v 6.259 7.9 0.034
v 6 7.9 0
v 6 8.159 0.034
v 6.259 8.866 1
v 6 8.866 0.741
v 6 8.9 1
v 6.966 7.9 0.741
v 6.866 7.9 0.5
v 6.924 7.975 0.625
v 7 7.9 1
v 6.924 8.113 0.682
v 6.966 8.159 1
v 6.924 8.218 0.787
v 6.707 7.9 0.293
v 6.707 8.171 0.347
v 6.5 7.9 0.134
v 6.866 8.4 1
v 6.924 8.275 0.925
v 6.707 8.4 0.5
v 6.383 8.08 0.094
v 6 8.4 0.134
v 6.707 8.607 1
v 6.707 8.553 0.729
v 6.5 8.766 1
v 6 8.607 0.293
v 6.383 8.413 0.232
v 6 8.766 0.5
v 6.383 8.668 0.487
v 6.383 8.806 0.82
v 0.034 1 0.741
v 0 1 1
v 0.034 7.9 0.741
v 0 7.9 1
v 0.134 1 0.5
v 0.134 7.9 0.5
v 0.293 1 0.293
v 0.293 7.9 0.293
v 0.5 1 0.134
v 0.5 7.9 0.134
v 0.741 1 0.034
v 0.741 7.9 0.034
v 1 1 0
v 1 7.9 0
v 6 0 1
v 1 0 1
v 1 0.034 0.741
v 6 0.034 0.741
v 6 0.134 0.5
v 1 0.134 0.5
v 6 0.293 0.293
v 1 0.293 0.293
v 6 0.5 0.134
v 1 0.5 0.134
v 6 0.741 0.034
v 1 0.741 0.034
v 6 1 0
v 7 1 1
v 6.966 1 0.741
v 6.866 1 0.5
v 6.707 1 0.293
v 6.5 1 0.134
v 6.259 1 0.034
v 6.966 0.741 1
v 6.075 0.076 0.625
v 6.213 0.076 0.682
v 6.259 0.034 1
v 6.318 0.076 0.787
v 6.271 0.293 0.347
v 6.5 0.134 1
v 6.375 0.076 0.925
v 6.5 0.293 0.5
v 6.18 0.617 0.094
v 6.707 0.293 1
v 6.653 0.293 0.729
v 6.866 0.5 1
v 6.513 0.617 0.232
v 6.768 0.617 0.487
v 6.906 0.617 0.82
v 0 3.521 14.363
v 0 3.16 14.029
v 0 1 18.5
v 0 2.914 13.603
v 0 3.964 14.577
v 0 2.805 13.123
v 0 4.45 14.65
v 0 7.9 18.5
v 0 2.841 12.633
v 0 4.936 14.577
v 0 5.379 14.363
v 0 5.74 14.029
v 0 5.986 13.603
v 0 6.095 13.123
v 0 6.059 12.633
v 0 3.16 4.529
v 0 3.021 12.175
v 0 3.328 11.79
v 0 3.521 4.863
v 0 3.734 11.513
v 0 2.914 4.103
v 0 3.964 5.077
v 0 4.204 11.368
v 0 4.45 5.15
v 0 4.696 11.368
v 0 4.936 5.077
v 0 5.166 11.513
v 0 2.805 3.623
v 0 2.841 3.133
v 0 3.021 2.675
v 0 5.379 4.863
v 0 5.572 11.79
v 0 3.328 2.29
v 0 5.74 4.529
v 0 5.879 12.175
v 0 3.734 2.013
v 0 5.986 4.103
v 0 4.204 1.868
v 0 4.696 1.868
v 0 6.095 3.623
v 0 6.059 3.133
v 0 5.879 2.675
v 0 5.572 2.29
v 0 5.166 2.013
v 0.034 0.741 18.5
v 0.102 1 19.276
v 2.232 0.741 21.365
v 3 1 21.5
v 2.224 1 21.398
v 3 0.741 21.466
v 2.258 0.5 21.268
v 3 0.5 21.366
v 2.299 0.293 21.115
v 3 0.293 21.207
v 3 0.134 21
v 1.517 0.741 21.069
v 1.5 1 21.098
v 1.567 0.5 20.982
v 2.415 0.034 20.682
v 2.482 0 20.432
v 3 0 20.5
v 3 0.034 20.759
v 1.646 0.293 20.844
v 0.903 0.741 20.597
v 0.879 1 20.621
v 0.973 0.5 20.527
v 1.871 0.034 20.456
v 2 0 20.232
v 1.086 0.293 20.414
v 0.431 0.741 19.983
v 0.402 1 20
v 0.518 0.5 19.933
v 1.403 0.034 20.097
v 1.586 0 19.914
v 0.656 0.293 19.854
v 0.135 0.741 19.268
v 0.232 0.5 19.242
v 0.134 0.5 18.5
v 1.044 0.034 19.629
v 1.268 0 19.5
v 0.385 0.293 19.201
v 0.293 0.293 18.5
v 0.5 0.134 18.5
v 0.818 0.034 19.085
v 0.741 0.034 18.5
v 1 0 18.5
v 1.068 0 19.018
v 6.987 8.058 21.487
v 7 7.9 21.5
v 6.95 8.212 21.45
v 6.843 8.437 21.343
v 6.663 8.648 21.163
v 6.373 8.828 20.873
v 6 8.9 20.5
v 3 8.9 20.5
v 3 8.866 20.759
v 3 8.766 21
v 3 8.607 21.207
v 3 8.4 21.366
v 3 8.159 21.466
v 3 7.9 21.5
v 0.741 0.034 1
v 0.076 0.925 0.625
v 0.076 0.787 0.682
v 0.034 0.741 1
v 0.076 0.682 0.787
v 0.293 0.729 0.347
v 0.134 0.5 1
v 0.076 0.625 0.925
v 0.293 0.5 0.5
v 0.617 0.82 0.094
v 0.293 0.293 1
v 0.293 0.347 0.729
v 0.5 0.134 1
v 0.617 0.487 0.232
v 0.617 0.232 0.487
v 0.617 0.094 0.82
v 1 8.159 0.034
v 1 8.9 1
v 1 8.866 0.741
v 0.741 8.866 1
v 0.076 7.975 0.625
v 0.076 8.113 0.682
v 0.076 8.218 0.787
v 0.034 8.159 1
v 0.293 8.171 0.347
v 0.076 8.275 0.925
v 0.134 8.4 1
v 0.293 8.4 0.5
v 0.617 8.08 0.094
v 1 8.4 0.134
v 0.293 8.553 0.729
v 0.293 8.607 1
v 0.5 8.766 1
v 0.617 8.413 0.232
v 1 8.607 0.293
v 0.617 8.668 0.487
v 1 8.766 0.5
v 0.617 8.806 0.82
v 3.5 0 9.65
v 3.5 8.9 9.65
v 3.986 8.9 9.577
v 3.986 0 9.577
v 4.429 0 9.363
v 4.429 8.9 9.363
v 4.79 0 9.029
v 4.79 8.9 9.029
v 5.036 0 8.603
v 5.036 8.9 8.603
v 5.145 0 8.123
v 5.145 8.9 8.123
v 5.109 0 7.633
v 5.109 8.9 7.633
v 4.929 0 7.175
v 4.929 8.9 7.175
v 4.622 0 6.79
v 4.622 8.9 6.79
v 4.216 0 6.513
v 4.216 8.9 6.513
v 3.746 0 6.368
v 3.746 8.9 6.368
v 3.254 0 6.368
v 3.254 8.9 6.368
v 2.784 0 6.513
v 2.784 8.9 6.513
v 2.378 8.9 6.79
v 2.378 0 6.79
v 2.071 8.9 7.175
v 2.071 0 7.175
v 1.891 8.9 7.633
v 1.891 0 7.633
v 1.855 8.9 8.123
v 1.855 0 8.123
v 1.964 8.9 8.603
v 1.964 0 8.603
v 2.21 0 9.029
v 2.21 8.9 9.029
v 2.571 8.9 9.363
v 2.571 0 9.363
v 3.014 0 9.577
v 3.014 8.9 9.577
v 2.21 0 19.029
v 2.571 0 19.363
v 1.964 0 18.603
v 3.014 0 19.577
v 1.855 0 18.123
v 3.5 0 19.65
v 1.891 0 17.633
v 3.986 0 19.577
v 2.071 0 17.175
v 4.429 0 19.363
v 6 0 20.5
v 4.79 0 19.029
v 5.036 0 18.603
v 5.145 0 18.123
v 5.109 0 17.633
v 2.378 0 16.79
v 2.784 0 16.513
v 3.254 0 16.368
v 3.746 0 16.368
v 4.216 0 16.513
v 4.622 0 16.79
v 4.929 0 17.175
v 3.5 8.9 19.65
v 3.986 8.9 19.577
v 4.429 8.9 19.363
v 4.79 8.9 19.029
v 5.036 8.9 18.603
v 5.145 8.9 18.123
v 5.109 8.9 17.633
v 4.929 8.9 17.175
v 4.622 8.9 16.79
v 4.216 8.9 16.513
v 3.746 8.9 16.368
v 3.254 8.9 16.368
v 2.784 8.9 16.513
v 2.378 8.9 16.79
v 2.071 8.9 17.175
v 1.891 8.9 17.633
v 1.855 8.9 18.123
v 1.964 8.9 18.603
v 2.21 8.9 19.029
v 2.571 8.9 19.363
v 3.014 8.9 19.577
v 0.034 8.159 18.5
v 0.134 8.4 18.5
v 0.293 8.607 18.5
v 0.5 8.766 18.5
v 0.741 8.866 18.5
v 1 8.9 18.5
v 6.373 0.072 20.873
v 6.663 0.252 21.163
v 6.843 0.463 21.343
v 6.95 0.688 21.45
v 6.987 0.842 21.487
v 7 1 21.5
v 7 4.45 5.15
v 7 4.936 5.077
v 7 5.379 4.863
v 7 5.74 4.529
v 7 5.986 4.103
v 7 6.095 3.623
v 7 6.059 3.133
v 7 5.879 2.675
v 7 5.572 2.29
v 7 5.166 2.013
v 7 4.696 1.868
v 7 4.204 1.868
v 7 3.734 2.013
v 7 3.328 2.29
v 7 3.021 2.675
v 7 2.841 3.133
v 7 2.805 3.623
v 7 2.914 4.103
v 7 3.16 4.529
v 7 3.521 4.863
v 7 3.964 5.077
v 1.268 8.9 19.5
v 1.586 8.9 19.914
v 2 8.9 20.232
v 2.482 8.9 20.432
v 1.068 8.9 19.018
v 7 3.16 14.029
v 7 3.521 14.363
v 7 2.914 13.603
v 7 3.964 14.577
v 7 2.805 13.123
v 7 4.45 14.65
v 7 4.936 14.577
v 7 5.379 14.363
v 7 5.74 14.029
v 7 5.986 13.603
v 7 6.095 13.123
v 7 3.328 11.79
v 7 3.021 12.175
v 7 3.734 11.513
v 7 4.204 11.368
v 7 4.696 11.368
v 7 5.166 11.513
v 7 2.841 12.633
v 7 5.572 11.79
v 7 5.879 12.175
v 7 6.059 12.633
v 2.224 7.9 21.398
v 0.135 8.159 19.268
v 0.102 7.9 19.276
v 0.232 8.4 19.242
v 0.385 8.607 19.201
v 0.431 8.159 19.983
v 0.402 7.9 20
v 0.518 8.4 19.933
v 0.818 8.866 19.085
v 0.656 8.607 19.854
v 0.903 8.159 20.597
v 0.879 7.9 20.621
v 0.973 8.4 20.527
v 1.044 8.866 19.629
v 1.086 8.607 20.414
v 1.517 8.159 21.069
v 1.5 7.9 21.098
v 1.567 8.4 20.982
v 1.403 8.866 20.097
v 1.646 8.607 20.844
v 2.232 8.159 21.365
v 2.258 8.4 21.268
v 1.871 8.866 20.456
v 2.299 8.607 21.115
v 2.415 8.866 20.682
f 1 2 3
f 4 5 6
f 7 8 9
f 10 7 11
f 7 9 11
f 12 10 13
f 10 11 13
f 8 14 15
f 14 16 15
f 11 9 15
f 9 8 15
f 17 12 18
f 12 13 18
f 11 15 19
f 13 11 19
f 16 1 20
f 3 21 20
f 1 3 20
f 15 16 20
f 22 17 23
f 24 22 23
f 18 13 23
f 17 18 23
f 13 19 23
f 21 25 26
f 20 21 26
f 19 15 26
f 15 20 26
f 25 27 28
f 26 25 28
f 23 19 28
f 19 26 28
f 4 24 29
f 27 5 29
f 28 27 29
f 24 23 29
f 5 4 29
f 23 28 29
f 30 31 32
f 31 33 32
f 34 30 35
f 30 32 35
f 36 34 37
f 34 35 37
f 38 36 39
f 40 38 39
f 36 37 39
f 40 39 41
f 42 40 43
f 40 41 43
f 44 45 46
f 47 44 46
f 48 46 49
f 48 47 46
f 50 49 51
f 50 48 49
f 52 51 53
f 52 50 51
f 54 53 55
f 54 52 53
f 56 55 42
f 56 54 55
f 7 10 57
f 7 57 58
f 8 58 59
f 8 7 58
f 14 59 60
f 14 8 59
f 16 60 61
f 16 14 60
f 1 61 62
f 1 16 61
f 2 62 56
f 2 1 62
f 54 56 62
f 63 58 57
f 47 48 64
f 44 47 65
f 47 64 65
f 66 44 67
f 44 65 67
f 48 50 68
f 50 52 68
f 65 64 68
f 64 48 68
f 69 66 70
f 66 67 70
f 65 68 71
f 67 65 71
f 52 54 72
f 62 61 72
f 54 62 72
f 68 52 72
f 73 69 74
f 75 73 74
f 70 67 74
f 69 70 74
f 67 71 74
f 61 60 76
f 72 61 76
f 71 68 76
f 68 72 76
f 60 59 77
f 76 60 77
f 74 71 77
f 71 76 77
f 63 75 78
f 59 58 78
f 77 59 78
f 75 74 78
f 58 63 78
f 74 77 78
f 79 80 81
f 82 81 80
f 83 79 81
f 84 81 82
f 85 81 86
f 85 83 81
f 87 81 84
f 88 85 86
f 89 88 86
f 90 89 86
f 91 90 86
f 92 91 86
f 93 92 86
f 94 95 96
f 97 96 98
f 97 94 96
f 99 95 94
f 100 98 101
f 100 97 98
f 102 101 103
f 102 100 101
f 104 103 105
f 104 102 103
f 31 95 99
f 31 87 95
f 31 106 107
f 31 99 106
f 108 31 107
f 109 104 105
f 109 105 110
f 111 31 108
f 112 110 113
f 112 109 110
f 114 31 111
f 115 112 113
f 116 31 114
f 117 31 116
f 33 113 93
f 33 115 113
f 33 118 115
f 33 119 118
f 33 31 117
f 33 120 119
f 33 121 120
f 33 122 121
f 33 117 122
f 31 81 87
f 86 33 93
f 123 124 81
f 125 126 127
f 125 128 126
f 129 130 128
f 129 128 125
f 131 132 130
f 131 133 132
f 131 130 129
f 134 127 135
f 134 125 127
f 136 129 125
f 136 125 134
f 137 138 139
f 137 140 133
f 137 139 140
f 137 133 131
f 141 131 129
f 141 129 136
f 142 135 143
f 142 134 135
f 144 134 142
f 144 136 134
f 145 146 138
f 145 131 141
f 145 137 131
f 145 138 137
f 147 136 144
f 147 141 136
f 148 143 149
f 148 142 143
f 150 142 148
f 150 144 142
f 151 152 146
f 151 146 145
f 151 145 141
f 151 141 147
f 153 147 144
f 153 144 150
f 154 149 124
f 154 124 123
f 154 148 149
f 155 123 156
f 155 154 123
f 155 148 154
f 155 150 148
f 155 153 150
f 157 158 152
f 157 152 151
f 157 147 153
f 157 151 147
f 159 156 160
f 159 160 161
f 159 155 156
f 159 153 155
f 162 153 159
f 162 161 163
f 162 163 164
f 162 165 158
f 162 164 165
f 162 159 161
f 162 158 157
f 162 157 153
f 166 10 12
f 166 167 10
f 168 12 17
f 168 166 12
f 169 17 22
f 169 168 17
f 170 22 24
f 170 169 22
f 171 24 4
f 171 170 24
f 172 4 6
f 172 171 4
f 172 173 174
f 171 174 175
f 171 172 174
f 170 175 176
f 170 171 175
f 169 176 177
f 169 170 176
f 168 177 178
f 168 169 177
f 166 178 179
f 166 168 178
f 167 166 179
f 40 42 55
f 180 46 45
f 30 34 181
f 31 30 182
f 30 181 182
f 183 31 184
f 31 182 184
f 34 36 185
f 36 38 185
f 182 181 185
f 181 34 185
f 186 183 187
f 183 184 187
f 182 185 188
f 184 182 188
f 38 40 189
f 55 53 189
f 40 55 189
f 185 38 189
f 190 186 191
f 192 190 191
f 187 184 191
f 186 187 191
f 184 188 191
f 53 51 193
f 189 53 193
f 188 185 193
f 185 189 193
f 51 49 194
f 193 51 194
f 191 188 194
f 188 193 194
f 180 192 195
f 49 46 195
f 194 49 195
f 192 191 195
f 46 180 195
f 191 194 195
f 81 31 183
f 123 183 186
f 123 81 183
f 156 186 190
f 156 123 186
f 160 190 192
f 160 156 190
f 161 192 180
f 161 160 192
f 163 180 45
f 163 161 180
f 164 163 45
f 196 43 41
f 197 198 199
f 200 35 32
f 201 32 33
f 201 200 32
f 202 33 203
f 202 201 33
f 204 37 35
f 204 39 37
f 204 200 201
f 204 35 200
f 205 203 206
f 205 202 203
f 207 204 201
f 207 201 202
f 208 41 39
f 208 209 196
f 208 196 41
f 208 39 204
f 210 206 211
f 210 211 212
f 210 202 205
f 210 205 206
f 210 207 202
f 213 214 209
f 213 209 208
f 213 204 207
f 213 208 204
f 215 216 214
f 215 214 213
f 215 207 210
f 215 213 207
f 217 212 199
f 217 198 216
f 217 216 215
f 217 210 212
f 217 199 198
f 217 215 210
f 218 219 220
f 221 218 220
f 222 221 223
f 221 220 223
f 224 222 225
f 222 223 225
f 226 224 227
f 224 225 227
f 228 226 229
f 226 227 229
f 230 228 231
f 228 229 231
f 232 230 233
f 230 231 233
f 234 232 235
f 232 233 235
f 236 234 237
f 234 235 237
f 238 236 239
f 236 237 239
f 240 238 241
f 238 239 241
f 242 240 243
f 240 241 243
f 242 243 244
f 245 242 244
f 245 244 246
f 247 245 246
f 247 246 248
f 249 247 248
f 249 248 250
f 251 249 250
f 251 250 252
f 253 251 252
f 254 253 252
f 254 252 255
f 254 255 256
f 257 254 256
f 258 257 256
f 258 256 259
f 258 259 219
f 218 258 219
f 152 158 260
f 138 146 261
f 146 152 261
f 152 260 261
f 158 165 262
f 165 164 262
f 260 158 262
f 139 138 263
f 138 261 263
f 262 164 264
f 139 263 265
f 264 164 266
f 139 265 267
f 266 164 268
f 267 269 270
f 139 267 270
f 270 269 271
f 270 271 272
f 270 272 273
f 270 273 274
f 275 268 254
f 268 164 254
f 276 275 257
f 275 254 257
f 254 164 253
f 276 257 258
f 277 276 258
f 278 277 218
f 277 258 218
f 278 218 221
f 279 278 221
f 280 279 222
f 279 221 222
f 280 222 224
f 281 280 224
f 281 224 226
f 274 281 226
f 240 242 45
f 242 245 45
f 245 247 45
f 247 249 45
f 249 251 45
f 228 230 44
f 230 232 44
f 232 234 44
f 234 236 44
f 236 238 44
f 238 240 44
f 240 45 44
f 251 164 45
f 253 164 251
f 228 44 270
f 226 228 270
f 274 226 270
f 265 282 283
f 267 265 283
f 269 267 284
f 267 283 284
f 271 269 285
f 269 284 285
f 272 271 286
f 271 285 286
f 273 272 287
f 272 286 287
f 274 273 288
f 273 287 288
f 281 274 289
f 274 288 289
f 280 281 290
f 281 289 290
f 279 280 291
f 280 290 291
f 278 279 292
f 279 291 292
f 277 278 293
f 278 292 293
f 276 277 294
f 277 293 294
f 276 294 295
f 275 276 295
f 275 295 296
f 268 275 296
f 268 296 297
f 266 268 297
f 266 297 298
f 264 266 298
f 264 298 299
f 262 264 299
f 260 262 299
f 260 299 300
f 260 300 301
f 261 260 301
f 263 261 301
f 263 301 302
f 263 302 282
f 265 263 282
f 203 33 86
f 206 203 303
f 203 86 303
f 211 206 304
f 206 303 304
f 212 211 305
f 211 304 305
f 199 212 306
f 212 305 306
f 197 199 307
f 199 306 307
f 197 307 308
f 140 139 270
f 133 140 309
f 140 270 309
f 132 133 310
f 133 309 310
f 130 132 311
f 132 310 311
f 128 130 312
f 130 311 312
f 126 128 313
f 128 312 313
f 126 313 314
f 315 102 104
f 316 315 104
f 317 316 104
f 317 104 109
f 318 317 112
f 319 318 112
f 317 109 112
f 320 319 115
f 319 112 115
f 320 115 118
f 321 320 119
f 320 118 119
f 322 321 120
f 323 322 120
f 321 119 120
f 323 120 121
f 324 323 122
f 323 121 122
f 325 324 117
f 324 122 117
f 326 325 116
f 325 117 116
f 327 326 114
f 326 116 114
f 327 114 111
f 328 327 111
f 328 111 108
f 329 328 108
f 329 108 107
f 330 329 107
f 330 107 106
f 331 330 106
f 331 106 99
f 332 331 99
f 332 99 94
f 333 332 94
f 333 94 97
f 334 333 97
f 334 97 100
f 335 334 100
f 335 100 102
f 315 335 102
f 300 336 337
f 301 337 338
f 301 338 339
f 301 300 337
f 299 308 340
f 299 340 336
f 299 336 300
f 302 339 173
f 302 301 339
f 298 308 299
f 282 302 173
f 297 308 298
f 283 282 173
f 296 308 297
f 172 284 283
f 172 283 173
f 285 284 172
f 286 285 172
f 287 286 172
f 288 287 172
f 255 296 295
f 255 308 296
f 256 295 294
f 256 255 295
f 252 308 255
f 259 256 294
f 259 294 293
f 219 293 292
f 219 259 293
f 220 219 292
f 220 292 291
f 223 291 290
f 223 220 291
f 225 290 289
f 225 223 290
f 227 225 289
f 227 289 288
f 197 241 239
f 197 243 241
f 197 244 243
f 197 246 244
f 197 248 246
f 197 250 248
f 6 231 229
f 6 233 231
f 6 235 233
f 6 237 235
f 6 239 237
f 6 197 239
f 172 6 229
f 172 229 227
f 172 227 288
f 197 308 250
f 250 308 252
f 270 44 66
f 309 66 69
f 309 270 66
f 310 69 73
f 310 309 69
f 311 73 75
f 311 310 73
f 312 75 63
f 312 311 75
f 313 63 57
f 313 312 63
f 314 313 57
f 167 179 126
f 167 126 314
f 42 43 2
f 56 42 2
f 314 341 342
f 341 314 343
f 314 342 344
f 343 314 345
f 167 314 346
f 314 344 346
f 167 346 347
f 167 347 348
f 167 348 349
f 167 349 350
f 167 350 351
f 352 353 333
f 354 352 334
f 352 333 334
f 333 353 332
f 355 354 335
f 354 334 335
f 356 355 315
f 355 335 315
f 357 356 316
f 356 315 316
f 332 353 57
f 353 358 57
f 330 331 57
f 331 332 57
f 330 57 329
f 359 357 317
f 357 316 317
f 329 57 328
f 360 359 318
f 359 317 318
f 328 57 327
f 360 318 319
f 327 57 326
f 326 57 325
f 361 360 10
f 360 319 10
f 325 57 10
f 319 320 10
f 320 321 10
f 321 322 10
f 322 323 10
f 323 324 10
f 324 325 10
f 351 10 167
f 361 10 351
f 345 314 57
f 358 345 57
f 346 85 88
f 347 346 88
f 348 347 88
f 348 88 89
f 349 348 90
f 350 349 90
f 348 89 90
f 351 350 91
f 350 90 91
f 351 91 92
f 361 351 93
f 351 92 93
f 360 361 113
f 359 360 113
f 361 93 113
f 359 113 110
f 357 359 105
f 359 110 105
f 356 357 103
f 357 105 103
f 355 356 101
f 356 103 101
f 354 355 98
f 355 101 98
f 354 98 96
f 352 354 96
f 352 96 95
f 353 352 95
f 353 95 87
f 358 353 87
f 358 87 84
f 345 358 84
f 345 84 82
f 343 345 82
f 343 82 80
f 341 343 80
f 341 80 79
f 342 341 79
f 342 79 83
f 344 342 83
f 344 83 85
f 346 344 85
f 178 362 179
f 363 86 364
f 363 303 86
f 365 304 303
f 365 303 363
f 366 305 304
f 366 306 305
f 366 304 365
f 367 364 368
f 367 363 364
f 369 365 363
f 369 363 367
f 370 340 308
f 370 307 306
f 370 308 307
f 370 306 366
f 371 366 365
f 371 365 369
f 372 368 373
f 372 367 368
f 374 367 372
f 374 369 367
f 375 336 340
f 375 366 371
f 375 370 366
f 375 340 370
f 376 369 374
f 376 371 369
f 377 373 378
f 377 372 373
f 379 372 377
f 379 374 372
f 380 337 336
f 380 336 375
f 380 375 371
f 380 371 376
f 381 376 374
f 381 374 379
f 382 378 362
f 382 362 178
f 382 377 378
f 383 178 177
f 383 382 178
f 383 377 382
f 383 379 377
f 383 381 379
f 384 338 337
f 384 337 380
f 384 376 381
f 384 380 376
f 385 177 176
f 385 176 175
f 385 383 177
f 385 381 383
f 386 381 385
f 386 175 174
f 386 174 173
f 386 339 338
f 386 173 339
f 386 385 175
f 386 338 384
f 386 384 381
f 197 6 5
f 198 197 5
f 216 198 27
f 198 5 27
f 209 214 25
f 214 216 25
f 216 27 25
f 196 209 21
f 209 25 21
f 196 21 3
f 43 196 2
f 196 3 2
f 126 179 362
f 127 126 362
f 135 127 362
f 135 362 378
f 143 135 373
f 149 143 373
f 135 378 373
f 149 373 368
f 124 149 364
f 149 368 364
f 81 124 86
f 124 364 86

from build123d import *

# Parameters (mm, degrees)
SKETCH_1_W          = 7
SKETCH_1_H          = 8.9
EXTRUDE_1_DEPTH     = 21.5
FILLET_1_R          = 1
SKETCH_6_R          = 1.65
CUT_EXTRUDE_2_DEPTH = 10
SKETCH_7_R          = 1.65
CUT_EXTRUDE_3_DEPTH = 10
FILLET_3_R          = 3


with BuildPart() as part:
    # 草图1 → 凸台-拉伸1 (new body)
    with BuildSketch(Plane.XY):
        with Locations((3.5, 4.45)):
            Rectangle(SKETCH_1_W, SKETCH_1_H)
    extrude(amount=EXTRUDE_1_DEPTH)

    # 圆角1
    fillet_1_edges = [part.edges().sort_by_distance(p)[0] for p in [
        (3.5, 8.9, 21.5),
        (3.5, 8.9, 0),
        (7, 4.45, 0),
        (3.5, 0, 0),
        (0, 4.45, 0),
        (3.5, 0, 21.5),
        (0, 8.9, 10.75),
        (7, 8.9, 10.75),
        (7, 0, 10.75),
        (0, 0, 10.75),
    ]]
    fillet(fillet_1_edges, radius=FILLET_1_R)

    # 草图6 → 切除-拉伸2 (cut)
    with BuildSketch(Plane.ZY):
        with Locations((3.5, 4.45)):
            Circle(SKETCH_6_R)
        with Locations((13, 4.45)):
            Circle(SKETCH_6_R)
    extrude(amount=-CUT_EXTRUDE_2_DEPTH, mode=Mode.SUBTRACT)

    # 草图7 → 切除-拉伸3 (cut)
    with BuildSketch(Plane(origin=(0, 8.9, 0), x_dir=(1, 0, 0), z_dir=(0, 1, 0))):
        with Locations(Location((3.5, -8, 0), (0, 0, 270))):
            Circle(SKETCH_7_R)
        with Locations(Location((3.5, -18, 0), (0, 0, 270))):
            Circle(SKETCH_7_R)
    extrude(amount=-CUT_EXTRUDE_3_DEPTH, mode=Mode.SUBTRACT)

    # 圆角3
    # the kernel refuses this fillet: 3 mm, written as the material it takes off along each edge
    with BuildSketch(Plane(origin=(3, 0, 18.5), x_dir=(0, 0, 1), z_dir=(1, 0, 0))) as fillet_3_piece_1:
        with BuildLine():
            CenterArc((2, -1), 1, 0, 90)
            Line((3, -1), (3, 0))
            Line((3, 0), (2, 0))
        make_face()
    revolve(axis=Axis((3, 0, 18.5), (0, -1, 0)), revolution_arc=90, mode=Mode.SUBTRACT)
    with BuildSketch(Plane(origin=(3, 8.9, 18.5), x_dir=(-1, 0, 0), z_dir=(0, 0, -1))) as fillet_3_piece_2:
        with BuildLine():
            CenterArc((2, -1), 1, 0, 90)
            Line((3, -1), (3, 0))
            Line((3, 0), (2, 0))
        make_face()
    revolve(axis=Axis((3, 8.9, 18.5), (0, 1, 0)), revolution_arc=90, mode=Mode.SUBTRACT)
    with BuildSketch(Plane(origin=(0, 8.9, 21.5), x_dir=(0, 0, -1), z_dir=(0, -1, 0))) as fillet_3_piece_3:
        with BuildLine():
            CenterArc((FILLET_3_R, FILLET_3_R), FILLET_3_R, 180, 90)
            Line((0, FILLET_3_R), (0, 0))
            Line((0, 0), (FILLET_3_R, 0))
        make_face()
    extrude(amount=8.9, mode=Mode.SUBTRACT)


solid = part.part
